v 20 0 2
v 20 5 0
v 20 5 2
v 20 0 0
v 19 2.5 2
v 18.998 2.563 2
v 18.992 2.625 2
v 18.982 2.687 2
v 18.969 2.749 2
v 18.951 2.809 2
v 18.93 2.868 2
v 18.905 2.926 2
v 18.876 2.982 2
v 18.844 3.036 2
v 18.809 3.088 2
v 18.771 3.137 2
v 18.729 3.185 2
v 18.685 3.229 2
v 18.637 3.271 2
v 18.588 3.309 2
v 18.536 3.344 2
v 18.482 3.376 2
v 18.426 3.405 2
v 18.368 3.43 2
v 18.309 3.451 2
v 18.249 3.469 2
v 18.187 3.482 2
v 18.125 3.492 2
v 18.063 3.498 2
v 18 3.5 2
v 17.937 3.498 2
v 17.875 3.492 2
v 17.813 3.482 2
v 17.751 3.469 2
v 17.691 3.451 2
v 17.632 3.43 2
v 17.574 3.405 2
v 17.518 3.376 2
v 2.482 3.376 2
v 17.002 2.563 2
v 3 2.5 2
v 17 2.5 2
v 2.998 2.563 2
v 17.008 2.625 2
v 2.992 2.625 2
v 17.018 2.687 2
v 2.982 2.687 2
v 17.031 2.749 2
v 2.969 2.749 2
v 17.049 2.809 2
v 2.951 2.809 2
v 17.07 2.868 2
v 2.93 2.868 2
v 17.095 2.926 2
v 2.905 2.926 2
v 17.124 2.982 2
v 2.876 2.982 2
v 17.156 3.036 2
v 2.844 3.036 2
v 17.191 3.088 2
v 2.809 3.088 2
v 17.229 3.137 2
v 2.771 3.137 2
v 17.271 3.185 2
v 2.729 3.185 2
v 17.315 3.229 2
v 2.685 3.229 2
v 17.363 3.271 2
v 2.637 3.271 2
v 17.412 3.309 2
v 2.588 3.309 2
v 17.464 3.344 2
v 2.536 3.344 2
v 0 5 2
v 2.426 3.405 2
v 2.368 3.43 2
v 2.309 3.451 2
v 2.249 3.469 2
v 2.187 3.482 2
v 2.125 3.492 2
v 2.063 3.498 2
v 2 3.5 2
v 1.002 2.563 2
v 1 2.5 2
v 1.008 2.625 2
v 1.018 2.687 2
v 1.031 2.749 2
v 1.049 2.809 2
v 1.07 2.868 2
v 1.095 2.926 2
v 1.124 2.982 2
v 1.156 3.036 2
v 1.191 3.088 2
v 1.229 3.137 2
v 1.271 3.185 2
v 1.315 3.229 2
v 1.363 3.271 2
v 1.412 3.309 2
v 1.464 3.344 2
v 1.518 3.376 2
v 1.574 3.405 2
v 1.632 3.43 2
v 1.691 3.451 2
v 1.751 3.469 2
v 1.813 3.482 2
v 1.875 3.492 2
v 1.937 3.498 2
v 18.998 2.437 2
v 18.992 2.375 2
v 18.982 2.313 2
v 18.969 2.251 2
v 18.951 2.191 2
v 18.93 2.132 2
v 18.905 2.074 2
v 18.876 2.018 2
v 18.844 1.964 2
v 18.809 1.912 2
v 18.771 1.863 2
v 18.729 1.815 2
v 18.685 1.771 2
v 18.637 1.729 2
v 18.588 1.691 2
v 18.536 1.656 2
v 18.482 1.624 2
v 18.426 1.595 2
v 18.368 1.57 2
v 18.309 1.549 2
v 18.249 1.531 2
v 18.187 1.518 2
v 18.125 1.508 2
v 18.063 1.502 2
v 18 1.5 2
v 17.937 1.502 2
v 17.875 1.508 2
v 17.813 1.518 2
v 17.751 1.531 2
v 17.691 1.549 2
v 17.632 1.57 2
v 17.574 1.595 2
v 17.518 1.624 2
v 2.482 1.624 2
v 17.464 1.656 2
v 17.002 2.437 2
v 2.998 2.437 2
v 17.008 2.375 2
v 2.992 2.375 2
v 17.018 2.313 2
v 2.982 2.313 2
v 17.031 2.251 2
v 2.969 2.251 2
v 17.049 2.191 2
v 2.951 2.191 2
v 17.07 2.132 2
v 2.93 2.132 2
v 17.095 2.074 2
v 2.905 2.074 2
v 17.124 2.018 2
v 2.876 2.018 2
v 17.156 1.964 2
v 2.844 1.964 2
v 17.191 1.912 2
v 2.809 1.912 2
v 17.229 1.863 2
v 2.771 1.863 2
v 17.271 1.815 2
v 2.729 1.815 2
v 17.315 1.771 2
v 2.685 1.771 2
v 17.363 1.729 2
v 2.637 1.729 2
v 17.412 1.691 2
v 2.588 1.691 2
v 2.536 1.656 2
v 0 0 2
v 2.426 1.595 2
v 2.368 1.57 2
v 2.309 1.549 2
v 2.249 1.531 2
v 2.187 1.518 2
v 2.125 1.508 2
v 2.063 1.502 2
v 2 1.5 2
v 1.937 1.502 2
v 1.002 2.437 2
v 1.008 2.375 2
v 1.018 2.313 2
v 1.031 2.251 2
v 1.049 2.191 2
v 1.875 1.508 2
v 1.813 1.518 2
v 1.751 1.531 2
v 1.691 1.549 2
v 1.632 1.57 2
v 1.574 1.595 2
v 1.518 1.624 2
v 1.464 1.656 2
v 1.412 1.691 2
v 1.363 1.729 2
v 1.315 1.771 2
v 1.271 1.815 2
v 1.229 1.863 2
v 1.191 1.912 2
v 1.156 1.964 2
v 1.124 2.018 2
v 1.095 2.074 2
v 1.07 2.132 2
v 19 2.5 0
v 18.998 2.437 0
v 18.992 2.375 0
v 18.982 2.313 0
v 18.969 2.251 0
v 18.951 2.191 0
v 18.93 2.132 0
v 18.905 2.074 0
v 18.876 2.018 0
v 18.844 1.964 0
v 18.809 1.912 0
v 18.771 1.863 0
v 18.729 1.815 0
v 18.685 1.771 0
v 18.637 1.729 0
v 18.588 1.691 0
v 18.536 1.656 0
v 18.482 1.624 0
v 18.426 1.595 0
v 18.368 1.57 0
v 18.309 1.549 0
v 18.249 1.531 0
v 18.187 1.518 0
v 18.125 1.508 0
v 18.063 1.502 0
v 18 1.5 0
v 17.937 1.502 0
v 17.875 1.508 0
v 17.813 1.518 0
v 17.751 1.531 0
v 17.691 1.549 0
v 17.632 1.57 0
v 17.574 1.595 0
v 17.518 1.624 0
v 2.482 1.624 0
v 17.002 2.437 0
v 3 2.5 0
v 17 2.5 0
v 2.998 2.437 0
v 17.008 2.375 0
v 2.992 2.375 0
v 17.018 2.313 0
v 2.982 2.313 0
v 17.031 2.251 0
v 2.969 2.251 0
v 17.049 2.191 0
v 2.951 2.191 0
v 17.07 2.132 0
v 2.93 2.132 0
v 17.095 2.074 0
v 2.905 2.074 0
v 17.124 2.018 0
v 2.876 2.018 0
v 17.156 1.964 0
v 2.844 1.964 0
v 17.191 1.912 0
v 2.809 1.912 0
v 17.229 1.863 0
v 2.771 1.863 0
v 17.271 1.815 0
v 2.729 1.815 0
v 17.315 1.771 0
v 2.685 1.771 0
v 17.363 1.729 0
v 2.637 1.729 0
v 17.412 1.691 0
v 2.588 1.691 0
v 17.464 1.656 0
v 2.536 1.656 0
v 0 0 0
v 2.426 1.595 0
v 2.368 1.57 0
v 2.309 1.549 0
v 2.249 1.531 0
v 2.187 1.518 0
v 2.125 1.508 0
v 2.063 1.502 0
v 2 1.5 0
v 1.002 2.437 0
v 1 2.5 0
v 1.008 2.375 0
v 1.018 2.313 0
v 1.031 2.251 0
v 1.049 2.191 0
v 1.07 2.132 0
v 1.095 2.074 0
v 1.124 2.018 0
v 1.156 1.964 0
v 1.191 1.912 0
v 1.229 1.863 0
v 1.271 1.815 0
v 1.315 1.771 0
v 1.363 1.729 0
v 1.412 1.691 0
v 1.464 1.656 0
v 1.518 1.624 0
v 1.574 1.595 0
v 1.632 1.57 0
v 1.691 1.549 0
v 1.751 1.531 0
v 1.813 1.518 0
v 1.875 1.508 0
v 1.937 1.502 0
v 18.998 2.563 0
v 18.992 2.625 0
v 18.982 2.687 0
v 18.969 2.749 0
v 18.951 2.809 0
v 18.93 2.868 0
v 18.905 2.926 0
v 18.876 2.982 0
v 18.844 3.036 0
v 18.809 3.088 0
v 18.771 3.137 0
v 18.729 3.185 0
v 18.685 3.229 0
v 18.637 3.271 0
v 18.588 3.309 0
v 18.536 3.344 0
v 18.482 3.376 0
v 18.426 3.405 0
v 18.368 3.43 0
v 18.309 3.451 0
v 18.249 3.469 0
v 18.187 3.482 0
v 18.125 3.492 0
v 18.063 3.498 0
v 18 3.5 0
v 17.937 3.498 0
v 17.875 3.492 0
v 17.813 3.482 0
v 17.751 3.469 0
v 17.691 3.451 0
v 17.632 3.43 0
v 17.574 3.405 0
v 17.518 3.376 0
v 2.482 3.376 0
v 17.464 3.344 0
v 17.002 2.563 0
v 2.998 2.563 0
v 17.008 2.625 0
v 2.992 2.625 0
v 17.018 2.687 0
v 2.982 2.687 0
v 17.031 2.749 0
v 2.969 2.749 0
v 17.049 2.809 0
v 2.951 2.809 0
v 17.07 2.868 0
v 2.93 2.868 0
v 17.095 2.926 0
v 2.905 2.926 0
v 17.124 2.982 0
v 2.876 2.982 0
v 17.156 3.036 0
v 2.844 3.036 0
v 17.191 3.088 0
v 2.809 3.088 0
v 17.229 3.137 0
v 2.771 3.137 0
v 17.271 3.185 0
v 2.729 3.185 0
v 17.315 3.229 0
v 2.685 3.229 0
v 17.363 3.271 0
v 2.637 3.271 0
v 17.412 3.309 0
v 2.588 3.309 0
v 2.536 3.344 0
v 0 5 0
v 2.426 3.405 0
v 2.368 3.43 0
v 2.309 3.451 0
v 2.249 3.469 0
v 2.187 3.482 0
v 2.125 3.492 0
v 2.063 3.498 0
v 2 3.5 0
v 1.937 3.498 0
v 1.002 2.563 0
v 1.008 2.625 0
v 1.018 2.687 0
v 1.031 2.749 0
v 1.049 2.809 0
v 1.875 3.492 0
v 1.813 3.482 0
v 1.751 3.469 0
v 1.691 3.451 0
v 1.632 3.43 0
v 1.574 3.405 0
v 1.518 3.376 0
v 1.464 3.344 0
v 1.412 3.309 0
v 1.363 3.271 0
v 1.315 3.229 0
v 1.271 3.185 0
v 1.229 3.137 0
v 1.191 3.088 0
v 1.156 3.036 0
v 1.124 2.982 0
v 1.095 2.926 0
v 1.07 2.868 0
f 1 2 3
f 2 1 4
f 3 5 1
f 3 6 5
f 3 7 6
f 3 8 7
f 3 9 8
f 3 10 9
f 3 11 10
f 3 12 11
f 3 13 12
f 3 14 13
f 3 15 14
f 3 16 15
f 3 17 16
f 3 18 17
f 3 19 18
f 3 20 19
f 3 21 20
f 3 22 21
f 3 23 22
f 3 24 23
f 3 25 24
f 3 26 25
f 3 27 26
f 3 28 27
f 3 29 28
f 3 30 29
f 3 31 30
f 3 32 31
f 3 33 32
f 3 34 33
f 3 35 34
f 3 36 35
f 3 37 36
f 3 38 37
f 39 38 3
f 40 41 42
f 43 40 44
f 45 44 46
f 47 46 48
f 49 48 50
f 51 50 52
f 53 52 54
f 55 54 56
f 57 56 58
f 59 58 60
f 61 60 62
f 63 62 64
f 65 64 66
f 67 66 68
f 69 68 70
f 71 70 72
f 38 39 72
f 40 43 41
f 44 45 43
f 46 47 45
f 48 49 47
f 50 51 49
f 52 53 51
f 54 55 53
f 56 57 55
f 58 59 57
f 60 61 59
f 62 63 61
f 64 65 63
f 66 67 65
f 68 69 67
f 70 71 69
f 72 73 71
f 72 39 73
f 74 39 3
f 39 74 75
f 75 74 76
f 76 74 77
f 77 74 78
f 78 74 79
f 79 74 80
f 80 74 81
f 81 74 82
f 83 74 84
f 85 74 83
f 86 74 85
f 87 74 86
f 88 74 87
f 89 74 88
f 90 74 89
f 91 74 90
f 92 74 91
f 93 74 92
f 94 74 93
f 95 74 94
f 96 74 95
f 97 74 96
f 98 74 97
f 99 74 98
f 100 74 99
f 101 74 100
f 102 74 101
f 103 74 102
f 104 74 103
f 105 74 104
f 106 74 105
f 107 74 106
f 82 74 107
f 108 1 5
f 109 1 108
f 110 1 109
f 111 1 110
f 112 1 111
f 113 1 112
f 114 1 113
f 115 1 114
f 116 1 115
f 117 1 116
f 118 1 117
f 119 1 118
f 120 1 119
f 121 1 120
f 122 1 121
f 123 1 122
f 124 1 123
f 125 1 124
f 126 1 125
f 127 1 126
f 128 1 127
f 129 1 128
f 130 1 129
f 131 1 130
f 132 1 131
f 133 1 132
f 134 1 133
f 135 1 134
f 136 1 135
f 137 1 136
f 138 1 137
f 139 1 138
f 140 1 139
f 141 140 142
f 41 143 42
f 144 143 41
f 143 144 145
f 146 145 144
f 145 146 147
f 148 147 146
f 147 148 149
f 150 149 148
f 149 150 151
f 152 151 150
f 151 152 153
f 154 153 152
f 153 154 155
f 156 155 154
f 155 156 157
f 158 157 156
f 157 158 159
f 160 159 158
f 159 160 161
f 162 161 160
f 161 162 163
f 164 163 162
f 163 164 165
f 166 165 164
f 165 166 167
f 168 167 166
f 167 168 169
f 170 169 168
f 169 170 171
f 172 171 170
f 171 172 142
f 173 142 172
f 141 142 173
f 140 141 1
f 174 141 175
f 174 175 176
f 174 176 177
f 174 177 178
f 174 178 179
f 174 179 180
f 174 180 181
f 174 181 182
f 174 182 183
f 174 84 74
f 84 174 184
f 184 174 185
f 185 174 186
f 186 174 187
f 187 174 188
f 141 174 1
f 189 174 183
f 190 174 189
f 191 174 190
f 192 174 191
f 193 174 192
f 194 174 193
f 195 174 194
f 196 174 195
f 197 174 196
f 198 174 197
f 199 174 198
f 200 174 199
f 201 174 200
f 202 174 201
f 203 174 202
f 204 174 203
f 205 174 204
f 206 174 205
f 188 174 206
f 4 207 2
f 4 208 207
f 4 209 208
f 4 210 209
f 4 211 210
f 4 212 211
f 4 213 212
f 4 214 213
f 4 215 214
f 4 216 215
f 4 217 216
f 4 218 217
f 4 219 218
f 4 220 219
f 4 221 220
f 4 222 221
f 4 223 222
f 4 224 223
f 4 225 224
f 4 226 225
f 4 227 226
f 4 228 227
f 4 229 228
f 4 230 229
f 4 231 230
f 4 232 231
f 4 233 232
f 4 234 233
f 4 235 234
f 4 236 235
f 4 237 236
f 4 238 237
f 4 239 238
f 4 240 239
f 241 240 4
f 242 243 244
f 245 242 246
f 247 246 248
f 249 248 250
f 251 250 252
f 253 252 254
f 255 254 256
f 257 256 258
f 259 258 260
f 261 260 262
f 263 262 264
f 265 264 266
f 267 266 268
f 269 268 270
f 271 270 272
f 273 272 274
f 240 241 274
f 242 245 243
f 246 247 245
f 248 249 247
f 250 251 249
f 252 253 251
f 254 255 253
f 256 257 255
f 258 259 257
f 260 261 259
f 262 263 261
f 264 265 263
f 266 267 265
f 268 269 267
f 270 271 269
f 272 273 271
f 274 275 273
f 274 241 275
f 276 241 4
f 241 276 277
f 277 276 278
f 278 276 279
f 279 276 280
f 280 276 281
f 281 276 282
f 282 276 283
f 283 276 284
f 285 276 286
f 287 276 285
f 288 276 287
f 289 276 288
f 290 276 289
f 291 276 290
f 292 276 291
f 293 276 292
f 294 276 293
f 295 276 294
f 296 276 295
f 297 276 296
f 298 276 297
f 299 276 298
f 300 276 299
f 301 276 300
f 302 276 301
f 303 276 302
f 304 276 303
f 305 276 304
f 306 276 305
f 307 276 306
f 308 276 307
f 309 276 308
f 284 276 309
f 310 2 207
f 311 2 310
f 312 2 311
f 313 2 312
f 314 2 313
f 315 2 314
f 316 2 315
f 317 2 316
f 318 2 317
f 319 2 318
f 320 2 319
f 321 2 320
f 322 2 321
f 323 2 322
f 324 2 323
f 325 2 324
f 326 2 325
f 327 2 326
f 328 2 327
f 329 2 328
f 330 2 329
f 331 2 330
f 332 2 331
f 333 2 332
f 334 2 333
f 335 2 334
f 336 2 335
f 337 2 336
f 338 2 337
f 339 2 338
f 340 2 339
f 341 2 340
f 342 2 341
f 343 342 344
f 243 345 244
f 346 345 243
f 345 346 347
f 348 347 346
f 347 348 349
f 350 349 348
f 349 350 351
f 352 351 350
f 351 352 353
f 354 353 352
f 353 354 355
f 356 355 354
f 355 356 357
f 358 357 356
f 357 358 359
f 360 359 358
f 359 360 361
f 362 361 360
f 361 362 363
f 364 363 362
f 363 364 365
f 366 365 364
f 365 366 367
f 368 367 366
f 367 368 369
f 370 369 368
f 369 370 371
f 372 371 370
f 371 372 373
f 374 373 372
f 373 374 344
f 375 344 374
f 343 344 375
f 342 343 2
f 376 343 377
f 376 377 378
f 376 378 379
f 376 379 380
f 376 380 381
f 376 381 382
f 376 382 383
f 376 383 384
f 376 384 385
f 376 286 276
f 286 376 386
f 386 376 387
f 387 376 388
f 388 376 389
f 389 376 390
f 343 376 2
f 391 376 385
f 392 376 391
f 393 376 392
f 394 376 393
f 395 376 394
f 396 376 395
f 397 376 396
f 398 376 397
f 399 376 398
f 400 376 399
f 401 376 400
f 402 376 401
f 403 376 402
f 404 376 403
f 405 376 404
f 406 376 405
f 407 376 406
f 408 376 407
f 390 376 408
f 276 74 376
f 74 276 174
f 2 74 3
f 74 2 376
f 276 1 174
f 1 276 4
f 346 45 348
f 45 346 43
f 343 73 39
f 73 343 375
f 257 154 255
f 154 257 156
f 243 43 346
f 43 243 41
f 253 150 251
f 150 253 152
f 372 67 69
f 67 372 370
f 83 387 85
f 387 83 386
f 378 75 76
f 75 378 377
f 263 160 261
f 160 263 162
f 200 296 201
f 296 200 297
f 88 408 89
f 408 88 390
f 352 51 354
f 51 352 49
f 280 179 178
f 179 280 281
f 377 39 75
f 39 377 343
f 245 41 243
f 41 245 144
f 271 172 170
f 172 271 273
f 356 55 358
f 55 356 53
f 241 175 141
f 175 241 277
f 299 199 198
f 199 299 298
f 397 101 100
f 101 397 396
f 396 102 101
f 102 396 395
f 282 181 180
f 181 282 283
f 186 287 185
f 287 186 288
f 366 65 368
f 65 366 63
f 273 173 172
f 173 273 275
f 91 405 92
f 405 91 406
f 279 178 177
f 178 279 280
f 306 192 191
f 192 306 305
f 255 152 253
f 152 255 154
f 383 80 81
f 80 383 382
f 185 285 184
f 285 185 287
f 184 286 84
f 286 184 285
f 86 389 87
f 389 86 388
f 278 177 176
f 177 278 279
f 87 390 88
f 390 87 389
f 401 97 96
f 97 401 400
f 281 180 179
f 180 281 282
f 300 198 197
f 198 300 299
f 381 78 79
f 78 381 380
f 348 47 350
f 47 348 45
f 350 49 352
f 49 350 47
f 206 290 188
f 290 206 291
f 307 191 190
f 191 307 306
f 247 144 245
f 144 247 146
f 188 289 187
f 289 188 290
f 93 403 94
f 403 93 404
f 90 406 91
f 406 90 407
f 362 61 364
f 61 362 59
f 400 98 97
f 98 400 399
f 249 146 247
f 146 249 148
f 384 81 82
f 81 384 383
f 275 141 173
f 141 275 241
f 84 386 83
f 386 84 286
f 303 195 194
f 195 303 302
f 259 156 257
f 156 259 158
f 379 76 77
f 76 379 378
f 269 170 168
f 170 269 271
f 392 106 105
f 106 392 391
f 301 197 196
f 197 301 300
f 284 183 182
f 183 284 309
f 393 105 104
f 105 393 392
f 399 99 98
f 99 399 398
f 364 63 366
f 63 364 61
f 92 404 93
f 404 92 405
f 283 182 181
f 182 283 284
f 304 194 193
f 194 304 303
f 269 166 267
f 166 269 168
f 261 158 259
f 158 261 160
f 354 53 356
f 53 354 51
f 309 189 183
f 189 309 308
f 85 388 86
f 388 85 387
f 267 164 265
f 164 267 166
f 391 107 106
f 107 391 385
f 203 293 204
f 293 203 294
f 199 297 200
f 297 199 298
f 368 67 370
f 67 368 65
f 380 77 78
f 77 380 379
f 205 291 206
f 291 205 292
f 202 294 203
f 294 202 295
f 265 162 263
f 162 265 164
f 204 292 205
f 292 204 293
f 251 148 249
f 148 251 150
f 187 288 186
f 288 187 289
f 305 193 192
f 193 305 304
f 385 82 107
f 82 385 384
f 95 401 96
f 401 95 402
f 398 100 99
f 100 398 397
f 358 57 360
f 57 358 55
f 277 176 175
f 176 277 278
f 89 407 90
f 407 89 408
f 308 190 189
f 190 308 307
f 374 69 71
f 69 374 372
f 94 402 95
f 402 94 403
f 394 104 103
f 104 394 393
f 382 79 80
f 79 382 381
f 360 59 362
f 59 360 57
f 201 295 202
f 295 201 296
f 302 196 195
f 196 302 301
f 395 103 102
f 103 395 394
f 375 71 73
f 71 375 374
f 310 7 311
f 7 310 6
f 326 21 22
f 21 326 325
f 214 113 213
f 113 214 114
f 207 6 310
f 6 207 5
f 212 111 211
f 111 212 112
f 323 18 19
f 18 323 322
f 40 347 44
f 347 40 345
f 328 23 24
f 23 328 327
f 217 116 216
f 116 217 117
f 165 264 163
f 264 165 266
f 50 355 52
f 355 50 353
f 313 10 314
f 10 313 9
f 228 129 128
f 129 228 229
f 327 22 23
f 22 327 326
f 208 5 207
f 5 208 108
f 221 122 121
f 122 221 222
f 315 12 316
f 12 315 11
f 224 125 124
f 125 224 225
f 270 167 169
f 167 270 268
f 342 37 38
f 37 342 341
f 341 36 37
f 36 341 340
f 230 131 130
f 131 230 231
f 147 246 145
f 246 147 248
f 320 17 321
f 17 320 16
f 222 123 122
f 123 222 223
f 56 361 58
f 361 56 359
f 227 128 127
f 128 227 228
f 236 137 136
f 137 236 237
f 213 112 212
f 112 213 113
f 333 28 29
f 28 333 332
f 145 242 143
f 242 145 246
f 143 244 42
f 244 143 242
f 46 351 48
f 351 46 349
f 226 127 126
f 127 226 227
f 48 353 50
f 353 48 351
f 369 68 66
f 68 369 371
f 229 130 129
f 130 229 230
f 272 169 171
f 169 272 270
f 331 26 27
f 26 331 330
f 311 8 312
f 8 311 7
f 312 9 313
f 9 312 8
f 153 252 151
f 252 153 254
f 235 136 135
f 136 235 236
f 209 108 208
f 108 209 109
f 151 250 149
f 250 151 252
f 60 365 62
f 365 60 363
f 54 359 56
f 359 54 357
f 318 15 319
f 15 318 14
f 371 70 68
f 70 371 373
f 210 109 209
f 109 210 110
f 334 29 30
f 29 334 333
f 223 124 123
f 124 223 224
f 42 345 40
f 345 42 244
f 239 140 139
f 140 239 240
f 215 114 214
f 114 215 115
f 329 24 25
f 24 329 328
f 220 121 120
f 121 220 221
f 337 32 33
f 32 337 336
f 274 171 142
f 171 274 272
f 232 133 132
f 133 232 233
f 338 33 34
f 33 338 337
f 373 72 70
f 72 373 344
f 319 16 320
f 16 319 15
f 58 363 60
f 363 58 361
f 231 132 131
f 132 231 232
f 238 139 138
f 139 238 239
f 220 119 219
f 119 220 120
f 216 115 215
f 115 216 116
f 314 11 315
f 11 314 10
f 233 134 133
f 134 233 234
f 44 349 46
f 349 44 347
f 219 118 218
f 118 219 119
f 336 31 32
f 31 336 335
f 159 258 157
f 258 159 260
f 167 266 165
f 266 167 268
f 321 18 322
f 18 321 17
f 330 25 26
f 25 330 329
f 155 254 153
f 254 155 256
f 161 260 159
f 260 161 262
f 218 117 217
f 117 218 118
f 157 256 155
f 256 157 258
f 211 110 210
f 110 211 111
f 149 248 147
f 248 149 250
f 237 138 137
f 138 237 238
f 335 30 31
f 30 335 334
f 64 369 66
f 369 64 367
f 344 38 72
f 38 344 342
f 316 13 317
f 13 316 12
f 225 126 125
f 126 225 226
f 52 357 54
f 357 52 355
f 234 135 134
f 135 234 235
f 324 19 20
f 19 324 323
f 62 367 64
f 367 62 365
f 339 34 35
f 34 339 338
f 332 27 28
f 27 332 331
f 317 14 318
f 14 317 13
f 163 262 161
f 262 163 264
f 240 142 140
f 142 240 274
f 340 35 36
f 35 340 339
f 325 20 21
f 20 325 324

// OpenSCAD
difference() {
  difference() {
    cube([20.0, 5.0, 2.0]);
    translate([2.0, 0, 0]) {
      translate([0, 2.5, 0]) {
        linear_extrude(height = 2.0) {
          circle(r = 1.0, $fn = 100);
        }
      }
    }
  }
  translate([18.0, 0, 0]) {
    translate([0, 2.5, 0]) {
      linear_extrude(height = 2.0) {
        circle(r = 1.0, $fn = 100);
      }
    }
  }
}
$fn = 50;
